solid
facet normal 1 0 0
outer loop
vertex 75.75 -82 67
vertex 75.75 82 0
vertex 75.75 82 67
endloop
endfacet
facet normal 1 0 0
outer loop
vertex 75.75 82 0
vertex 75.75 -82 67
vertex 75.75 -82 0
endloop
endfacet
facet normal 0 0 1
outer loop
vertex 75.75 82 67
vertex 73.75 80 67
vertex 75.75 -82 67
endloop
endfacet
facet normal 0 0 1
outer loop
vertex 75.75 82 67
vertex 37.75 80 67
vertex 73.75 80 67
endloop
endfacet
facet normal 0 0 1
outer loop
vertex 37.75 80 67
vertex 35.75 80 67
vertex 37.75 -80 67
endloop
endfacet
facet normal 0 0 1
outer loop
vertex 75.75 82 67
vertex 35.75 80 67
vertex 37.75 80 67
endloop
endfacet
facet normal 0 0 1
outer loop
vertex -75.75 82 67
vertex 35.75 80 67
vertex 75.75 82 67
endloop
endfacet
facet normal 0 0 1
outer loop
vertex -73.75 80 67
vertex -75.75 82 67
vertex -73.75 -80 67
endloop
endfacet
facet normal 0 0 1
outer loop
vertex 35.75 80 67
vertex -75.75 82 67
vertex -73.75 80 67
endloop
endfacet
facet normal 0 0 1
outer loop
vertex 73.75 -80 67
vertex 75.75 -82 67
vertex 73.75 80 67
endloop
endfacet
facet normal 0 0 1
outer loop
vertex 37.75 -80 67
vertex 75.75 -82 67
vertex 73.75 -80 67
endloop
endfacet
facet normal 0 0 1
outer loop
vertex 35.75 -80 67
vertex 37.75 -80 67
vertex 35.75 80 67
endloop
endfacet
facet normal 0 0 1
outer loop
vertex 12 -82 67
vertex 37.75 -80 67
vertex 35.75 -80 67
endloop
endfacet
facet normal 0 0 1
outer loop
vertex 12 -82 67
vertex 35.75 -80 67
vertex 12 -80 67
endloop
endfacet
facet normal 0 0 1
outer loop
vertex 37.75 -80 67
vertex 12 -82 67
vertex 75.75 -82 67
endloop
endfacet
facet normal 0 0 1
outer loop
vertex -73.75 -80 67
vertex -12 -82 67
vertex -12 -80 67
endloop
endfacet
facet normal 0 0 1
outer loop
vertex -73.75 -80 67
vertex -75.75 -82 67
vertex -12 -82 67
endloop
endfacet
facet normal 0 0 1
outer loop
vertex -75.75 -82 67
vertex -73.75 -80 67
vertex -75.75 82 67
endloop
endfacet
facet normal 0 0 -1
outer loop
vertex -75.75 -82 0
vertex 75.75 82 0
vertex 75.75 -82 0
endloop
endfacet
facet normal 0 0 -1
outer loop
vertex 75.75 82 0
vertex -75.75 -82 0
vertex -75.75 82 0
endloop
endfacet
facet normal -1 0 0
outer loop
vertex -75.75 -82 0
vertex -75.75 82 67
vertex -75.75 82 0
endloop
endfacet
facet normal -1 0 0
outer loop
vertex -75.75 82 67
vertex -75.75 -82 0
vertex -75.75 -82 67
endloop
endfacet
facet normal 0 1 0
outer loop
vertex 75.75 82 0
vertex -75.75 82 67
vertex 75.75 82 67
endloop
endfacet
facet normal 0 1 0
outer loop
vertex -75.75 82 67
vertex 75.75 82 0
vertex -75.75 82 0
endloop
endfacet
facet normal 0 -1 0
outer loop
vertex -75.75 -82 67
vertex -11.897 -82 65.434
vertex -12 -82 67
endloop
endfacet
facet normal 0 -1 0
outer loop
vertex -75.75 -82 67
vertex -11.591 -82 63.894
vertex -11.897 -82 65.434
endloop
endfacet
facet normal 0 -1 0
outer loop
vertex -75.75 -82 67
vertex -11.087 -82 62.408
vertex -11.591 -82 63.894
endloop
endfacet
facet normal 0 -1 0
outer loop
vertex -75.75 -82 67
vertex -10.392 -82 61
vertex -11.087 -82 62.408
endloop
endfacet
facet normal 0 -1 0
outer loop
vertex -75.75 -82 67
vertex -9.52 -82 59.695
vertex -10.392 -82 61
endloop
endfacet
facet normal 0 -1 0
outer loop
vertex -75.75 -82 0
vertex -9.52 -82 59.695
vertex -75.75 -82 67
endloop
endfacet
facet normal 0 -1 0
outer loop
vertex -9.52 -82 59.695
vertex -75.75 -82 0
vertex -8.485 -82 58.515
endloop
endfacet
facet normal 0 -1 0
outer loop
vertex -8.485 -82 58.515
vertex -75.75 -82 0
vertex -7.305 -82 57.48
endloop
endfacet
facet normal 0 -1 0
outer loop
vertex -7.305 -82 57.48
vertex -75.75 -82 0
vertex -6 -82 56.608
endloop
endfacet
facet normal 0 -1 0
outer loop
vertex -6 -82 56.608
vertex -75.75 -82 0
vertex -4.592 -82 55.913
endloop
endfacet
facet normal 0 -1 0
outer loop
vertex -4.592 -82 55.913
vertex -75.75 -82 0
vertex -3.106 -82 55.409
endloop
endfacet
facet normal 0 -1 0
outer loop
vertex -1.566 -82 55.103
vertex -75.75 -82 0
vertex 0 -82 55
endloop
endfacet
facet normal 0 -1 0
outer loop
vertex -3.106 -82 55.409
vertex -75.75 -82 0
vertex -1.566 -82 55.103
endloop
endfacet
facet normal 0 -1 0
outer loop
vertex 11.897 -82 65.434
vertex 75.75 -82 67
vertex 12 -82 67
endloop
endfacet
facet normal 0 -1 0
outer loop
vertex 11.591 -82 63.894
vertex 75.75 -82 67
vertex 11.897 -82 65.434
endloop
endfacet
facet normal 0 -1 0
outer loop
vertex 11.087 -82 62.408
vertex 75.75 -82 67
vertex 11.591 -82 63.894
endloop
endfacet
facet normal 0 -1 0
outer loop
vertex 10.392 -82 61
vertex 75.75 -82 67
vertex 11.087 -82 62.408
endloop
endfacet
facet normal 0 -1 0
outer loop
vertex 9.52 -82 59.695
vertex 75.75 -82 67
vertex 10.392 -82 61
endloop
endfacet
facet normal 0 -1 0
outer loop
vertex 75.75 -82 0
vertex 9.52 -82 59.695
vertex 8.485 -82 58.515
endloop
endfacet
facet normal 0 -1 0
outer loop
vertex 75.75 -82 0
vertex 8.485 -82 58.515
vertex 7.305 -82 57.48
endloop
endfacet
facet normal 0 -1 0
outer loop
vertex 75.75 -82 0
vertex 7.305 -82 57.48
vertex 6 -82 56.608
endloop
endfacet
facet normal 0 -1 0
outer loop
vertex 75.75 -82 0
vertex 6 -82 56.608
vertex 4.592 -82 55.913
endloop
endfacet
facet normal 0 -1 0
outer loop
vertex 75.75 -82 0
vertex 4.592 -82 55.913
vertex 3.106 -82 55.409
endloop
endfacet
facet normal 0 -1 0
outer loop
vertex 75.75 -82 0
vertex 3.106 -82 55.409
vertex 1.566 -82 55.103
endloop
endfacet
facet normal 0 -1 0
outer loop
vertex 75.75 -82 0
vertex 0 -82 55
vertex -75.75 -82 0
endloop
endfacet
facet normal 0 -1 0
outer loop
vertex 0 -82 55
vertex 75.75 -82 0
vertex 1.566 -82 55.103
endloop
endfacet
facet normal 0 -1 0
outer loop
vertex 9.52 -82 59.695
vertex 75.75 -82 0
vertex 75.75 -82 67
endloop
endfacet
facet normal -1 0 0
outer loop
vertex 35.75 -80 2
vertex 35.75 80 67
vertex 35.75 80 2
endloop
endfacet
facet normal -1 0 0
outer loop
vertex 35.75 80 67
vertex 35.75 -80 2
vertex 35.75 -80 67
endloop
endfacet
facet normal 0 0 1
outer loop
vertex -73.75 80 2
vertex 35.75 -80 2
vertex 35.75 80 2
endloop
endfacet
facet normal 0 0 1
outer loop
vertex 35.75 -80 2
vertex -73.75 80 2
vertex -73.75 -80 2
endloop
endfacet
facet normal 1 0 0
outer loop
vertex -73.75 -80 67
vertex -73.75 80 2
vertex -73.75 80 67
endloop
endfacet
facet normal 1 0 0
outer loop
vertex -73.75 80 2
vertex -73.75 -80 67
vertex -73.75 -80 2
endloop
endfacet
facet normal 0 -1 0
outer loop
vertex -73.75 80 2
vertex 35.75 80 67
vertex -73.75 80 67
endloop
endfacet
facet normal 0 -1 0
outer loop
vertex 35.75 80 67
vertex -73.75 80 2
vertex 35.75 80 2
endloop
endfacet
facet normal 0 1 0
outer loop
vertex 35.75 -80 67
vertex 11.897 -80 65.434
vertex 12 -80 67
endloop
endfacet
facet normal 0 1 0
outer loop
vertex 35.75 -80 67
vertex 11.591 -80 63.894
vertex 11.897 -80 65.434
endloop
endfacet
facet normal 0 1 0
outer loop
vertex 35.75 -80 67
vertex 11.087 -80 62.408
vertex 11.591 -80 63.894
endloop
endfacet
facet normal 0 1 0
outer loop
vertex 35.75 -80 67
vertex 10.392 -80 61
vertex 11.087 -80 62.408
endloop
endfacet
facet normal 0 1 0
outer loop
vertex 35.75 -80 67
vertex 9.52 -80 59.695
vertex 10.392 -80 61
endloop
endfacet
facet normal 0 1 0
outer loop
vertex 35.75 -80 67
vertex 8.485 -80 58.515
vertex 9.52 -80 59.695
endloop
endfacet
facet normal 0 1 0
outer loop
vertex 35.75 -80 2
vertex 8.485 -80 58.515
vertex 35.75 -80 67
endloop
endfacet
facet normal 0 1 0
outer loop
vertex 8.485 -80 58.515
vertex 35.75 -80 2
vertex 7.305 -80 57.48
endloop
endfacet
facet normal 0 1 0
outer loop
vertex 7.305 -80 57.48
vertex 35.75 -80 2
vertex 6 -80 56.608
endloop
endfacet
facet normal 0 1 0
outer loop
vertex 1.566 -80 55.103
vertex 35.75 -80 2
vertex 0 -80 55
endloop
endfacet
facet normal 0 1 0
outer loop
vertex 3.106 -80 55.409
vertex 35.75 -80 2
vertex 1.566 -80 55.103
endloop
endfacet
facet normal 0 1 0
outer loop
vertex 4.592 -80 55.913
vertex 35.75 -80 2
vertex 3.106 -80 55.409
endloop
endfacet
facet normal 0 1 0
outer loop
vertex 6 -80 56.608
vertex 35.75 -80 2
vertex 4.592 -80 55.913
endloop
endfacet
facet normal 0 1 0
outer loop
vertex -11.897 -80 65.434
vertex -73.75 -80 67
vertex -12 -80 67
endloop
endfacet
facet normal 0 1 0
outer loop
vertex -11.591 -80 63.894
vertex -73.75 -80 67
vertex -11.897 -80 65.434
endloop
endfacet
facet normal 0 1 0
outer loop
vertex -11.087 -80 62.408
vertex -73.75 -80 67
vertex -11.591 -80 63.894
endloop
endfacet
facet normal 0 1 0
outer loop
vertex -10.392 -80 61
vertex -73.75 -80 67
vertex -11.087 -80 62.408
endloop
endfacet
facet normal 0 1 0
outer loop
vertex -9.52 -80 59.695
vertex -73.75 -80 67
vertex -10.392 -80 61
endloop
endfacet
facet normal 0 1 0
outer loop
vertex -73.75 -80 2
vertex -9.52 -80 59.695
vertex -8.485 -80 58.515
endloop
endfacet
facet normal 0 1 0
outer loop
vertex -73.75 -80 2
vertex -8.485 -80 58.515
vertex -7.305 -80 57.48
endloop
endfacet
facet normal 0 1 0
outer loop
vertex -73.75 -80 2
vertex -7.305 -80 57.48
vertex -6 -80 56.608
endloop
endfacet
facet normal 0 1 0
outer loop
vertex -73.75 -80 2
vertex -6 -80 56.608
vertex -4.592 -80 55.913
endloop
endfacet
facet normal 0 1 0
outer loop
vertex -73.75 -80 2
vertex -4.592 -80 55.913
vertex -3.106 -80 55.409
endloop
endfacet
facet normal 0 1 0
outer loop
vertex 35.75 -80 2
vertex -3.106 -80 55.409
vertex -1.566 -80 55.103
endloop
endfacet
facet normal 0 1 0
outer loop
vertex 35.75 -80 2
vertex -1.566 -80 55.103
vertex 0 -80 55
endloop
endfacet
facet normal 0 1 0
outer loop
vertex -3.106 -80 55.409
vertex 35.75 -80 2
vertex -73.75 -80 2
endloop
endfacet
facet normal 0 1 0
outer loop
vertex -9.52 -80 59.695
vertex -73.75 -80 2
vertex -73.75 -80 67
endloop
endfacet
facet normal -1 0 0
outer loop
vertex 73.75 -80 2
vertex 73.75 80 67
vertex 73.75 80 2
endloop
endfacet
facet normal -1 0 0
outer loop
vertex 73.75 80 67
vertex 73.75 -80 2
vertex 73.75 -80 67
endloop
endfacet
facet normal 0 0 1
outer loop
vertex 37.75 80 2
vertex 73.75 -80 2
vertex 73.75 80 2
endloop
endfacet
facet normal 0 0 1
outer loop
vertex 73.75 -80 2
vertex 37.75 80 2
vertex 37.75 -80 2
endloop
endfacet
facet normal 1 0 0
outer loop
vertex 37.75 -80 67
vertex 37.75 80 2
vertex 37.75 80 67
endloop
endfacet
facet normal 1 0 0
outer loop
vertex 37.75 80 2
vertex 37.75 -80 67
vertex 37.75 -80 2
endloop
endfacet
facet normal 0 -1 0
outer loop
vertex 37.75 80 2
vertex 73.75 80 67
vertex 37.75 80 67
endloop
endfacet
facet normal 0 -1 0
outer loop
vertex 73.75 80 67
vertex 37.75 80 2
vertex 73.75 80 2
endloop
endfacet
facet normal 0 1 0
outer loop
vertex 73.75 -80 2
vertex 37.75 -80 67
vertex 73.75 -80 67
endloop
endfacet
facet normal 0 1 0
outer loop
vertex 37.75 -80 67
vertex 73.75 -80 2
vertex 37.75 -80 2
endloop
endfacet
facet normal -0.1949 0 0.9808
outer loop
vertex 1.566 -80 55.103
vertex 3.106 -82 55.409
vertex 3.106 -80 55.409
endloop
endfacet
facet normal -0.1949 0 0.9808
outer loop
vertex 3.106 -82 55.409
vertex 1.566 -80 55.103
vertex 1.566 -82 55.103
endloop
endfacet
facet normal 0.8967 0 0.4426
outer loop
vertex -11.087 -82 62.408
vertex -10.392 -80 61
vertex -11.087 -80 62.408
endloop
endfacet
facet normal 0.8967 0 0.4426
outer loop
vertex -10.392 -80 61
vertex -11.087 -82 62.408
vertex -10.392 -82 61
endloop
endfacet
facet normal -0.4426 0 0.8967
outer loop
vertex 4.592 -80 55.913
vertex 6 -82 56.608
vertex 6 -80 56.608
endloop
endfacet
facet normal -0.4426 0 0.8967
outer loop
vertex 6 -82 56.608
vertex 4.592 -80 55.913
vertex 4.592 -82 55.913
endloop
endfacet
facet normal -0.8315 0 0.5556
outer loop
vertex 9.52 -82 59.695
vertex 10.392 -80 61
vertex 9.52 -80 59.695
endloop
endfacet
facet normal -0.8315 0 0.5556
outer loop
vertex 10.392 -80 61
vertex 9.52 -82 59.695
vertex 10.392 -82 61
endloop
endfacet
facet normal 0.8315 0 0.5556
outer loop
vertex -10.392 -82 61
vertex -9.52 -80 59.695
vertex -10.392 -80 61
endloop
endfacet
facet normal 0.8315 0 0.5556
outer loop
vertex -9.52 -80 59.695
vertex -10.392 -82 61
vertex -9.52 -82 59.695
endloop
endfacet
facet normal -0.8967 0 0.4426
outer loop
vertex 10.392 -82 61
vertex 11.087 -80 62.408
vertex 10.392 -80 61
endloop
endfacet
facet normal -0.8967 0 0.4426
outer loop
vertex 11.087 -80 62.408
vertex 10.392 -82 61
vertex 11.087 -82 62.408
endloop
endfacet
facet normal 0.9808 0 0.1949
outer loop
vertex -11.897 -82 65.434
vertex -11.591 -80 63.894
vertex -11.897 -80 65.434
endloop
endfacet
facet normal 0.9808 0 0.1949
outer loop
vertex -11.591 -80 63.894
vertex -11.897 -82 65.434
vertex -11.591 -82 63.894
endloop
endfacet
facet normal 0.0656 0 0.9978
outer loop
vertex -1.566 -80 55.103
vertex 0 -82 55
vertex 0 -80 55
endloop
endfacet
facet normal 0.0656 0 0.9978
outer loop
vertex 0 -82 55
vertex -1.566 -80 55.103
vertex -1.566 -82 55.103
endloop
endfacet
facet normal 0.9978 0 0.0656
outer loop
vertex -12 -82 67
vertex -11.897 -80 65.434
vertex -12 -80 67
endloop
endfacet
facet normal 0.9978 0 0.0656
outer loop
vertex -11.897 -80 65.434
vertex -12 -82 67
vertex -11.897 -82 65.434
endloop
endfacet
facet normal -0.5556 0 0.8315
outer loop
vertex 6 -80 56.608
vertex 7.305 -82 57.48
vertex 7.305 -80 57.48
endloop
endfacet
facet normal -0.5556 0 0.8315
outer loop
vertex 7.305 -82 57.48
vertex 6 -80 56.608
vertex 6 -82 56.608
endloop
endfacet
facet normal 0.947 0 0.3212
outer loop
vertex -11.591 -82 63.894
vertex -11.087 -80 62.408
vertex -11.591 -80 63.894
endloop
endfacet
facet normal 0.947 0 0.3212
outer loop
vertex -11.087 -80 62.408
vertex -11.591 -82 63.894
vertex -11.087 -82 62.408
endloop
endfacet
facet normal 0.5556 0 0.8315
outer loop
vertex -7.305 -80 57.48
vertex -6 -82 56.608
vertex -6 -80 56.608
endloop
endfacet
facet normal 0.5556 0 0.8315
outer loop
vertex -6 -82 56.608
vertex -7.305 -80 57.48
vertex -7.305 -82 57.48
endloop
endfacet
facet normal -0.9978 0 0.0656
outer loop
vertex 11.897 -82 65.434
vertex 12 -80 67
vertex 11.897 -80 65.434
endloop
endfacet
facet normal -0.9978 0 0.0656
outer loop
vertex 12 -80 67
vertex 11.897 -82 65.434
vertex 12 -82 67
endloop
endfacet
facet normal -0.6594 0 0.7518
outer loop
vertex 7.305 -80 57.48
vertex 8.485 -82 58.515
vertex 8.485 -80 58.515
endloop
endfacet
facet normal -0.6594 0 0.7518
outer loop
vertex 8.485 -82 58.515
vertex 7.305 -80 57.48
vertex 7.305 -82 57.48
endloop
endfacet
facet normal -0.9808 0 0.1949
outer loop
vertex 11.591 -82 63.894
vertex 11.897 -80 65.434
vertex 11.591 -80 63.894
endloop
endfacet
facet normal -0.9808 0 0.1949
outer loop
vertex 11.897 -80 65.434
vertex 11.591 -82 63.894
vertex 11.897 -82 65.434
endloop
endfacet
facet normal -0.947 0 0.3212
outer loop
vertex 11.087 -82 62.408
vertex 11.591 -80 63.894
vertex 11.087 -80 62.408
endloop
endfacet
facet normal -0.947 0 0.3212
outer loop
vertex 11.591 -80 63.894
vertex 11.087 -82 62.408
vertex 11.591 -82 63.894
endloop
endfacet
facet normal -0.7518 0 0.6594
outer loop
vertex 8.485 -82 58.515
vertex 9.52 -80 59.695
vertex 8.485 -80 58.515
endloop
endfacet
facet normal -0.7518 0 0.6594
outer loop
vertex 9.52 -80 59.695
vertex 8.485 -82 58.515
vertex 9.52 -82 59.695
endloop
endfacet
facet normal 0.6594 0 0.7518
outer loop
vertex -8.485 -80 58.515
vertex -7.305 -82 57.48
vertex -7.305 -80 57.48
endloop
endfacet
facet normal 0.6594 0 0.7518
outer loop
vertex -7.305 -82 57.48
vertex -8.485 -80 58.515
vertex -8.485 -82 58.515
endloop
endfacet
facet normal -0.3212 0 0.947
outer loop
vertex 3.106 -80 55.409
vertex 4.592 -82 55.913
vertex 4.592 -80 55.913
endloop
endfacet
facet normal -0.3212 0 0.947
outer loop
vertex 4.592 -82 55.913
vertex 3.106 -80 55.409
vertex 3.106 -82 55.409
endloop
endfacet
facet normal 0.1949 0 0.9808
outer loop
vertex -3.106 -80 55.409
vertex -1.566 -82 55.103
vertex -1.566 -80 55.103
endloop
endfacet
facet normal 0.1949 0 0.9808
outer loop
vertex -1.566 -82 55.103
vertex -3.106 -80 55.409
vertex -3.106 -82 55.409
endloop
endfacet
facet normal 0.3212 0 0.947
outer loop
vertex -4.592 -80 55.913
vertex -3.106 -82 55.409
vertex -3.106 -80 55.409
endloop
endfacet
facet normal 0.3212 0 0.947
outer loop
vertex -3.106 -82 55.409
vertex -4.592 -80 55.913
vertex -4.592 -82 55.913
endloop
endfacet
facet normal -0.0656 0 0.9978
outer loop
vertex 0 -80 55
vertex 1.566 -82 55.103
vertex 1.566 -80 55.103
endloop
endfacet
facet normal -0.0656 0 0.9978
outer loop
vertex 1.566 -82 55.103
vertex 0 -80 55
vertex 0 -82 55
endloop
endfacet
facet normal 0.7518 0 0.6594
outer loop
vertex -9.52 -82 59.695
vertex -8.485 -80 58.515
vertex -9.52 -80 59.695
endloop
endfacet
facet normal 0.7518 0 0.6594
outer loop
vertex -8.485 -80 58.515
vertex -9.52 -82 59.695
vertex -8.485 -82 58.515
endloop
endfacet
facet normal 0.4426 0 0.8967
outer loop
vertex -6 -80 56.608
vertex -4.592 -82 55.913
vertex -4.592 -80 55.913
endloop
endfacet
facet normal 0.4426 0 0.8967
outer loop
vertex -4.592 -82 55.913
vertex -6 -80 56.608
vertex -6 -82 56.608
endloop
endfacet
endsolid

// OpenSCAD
// rig_drawer.scad — the cord drawer.
//
// Two compartments: the wide one for the spare 6+2 cables and the 12VHPWR
// lead, the narrow one on the right for the riser's x1 card and its USB lead.
// Finger notch in the front. Prints open-top up, no supports.
//
// Narrower than the bay by 2 x BOSS_IN + 1 so it slides past the frame's
// screw bosses; its front face comes flush with the frame's front edge.

include <rig_common.scad>

module rig_drawer() {
    iw = DRAWER_W - 2*DRAWER_WALL;
    id = DRAWER_D - 2*DRAWER_WALL;
    x1_w   = X1_BAY_W;                          // right-hand compartment, inner
    cord_w = iw - x1_w - DRAWER_WALL;           // what's left on the left
    assert(cord_w > 80, "cord compartment has gone too narrow");
    difference() {
        translate([-DRAWER_W/2, -DRAWER_D/2, 0]) cube([DRAWER_W, DRAWER_D, DRAWER_H]);
        // cord compartment
        translate([-DRAWER_W/2 + DRAWER_WALL, -id/2, DRAWER_FLOOR]) cube([cord_w, id, DRAWER_H]);
        // x1 card + USB compartment
        translate([DRAWER_W/2 - DRAWER_WALL - x1_w, -id/2, DRAWER_FLOOR]) cube([x1_w, id, DRAWER_H]);
        // finger pull, a half-round out of the front wall's top edge
        translate([0, -DRAWER_D/2, DRAWER_H]) rotate([90, 0, 0]) cylinder(r = PULL_R, h = DRAWER_WALL*3, center = true);
    }
}

rig_drawer();
echo(str("rig_drawer: ", DRAWER_W, " x ", DRAWER_D, " x ", DRAWER_H, " mm; x1 bay ", X1_BAY_W, " wide"));
